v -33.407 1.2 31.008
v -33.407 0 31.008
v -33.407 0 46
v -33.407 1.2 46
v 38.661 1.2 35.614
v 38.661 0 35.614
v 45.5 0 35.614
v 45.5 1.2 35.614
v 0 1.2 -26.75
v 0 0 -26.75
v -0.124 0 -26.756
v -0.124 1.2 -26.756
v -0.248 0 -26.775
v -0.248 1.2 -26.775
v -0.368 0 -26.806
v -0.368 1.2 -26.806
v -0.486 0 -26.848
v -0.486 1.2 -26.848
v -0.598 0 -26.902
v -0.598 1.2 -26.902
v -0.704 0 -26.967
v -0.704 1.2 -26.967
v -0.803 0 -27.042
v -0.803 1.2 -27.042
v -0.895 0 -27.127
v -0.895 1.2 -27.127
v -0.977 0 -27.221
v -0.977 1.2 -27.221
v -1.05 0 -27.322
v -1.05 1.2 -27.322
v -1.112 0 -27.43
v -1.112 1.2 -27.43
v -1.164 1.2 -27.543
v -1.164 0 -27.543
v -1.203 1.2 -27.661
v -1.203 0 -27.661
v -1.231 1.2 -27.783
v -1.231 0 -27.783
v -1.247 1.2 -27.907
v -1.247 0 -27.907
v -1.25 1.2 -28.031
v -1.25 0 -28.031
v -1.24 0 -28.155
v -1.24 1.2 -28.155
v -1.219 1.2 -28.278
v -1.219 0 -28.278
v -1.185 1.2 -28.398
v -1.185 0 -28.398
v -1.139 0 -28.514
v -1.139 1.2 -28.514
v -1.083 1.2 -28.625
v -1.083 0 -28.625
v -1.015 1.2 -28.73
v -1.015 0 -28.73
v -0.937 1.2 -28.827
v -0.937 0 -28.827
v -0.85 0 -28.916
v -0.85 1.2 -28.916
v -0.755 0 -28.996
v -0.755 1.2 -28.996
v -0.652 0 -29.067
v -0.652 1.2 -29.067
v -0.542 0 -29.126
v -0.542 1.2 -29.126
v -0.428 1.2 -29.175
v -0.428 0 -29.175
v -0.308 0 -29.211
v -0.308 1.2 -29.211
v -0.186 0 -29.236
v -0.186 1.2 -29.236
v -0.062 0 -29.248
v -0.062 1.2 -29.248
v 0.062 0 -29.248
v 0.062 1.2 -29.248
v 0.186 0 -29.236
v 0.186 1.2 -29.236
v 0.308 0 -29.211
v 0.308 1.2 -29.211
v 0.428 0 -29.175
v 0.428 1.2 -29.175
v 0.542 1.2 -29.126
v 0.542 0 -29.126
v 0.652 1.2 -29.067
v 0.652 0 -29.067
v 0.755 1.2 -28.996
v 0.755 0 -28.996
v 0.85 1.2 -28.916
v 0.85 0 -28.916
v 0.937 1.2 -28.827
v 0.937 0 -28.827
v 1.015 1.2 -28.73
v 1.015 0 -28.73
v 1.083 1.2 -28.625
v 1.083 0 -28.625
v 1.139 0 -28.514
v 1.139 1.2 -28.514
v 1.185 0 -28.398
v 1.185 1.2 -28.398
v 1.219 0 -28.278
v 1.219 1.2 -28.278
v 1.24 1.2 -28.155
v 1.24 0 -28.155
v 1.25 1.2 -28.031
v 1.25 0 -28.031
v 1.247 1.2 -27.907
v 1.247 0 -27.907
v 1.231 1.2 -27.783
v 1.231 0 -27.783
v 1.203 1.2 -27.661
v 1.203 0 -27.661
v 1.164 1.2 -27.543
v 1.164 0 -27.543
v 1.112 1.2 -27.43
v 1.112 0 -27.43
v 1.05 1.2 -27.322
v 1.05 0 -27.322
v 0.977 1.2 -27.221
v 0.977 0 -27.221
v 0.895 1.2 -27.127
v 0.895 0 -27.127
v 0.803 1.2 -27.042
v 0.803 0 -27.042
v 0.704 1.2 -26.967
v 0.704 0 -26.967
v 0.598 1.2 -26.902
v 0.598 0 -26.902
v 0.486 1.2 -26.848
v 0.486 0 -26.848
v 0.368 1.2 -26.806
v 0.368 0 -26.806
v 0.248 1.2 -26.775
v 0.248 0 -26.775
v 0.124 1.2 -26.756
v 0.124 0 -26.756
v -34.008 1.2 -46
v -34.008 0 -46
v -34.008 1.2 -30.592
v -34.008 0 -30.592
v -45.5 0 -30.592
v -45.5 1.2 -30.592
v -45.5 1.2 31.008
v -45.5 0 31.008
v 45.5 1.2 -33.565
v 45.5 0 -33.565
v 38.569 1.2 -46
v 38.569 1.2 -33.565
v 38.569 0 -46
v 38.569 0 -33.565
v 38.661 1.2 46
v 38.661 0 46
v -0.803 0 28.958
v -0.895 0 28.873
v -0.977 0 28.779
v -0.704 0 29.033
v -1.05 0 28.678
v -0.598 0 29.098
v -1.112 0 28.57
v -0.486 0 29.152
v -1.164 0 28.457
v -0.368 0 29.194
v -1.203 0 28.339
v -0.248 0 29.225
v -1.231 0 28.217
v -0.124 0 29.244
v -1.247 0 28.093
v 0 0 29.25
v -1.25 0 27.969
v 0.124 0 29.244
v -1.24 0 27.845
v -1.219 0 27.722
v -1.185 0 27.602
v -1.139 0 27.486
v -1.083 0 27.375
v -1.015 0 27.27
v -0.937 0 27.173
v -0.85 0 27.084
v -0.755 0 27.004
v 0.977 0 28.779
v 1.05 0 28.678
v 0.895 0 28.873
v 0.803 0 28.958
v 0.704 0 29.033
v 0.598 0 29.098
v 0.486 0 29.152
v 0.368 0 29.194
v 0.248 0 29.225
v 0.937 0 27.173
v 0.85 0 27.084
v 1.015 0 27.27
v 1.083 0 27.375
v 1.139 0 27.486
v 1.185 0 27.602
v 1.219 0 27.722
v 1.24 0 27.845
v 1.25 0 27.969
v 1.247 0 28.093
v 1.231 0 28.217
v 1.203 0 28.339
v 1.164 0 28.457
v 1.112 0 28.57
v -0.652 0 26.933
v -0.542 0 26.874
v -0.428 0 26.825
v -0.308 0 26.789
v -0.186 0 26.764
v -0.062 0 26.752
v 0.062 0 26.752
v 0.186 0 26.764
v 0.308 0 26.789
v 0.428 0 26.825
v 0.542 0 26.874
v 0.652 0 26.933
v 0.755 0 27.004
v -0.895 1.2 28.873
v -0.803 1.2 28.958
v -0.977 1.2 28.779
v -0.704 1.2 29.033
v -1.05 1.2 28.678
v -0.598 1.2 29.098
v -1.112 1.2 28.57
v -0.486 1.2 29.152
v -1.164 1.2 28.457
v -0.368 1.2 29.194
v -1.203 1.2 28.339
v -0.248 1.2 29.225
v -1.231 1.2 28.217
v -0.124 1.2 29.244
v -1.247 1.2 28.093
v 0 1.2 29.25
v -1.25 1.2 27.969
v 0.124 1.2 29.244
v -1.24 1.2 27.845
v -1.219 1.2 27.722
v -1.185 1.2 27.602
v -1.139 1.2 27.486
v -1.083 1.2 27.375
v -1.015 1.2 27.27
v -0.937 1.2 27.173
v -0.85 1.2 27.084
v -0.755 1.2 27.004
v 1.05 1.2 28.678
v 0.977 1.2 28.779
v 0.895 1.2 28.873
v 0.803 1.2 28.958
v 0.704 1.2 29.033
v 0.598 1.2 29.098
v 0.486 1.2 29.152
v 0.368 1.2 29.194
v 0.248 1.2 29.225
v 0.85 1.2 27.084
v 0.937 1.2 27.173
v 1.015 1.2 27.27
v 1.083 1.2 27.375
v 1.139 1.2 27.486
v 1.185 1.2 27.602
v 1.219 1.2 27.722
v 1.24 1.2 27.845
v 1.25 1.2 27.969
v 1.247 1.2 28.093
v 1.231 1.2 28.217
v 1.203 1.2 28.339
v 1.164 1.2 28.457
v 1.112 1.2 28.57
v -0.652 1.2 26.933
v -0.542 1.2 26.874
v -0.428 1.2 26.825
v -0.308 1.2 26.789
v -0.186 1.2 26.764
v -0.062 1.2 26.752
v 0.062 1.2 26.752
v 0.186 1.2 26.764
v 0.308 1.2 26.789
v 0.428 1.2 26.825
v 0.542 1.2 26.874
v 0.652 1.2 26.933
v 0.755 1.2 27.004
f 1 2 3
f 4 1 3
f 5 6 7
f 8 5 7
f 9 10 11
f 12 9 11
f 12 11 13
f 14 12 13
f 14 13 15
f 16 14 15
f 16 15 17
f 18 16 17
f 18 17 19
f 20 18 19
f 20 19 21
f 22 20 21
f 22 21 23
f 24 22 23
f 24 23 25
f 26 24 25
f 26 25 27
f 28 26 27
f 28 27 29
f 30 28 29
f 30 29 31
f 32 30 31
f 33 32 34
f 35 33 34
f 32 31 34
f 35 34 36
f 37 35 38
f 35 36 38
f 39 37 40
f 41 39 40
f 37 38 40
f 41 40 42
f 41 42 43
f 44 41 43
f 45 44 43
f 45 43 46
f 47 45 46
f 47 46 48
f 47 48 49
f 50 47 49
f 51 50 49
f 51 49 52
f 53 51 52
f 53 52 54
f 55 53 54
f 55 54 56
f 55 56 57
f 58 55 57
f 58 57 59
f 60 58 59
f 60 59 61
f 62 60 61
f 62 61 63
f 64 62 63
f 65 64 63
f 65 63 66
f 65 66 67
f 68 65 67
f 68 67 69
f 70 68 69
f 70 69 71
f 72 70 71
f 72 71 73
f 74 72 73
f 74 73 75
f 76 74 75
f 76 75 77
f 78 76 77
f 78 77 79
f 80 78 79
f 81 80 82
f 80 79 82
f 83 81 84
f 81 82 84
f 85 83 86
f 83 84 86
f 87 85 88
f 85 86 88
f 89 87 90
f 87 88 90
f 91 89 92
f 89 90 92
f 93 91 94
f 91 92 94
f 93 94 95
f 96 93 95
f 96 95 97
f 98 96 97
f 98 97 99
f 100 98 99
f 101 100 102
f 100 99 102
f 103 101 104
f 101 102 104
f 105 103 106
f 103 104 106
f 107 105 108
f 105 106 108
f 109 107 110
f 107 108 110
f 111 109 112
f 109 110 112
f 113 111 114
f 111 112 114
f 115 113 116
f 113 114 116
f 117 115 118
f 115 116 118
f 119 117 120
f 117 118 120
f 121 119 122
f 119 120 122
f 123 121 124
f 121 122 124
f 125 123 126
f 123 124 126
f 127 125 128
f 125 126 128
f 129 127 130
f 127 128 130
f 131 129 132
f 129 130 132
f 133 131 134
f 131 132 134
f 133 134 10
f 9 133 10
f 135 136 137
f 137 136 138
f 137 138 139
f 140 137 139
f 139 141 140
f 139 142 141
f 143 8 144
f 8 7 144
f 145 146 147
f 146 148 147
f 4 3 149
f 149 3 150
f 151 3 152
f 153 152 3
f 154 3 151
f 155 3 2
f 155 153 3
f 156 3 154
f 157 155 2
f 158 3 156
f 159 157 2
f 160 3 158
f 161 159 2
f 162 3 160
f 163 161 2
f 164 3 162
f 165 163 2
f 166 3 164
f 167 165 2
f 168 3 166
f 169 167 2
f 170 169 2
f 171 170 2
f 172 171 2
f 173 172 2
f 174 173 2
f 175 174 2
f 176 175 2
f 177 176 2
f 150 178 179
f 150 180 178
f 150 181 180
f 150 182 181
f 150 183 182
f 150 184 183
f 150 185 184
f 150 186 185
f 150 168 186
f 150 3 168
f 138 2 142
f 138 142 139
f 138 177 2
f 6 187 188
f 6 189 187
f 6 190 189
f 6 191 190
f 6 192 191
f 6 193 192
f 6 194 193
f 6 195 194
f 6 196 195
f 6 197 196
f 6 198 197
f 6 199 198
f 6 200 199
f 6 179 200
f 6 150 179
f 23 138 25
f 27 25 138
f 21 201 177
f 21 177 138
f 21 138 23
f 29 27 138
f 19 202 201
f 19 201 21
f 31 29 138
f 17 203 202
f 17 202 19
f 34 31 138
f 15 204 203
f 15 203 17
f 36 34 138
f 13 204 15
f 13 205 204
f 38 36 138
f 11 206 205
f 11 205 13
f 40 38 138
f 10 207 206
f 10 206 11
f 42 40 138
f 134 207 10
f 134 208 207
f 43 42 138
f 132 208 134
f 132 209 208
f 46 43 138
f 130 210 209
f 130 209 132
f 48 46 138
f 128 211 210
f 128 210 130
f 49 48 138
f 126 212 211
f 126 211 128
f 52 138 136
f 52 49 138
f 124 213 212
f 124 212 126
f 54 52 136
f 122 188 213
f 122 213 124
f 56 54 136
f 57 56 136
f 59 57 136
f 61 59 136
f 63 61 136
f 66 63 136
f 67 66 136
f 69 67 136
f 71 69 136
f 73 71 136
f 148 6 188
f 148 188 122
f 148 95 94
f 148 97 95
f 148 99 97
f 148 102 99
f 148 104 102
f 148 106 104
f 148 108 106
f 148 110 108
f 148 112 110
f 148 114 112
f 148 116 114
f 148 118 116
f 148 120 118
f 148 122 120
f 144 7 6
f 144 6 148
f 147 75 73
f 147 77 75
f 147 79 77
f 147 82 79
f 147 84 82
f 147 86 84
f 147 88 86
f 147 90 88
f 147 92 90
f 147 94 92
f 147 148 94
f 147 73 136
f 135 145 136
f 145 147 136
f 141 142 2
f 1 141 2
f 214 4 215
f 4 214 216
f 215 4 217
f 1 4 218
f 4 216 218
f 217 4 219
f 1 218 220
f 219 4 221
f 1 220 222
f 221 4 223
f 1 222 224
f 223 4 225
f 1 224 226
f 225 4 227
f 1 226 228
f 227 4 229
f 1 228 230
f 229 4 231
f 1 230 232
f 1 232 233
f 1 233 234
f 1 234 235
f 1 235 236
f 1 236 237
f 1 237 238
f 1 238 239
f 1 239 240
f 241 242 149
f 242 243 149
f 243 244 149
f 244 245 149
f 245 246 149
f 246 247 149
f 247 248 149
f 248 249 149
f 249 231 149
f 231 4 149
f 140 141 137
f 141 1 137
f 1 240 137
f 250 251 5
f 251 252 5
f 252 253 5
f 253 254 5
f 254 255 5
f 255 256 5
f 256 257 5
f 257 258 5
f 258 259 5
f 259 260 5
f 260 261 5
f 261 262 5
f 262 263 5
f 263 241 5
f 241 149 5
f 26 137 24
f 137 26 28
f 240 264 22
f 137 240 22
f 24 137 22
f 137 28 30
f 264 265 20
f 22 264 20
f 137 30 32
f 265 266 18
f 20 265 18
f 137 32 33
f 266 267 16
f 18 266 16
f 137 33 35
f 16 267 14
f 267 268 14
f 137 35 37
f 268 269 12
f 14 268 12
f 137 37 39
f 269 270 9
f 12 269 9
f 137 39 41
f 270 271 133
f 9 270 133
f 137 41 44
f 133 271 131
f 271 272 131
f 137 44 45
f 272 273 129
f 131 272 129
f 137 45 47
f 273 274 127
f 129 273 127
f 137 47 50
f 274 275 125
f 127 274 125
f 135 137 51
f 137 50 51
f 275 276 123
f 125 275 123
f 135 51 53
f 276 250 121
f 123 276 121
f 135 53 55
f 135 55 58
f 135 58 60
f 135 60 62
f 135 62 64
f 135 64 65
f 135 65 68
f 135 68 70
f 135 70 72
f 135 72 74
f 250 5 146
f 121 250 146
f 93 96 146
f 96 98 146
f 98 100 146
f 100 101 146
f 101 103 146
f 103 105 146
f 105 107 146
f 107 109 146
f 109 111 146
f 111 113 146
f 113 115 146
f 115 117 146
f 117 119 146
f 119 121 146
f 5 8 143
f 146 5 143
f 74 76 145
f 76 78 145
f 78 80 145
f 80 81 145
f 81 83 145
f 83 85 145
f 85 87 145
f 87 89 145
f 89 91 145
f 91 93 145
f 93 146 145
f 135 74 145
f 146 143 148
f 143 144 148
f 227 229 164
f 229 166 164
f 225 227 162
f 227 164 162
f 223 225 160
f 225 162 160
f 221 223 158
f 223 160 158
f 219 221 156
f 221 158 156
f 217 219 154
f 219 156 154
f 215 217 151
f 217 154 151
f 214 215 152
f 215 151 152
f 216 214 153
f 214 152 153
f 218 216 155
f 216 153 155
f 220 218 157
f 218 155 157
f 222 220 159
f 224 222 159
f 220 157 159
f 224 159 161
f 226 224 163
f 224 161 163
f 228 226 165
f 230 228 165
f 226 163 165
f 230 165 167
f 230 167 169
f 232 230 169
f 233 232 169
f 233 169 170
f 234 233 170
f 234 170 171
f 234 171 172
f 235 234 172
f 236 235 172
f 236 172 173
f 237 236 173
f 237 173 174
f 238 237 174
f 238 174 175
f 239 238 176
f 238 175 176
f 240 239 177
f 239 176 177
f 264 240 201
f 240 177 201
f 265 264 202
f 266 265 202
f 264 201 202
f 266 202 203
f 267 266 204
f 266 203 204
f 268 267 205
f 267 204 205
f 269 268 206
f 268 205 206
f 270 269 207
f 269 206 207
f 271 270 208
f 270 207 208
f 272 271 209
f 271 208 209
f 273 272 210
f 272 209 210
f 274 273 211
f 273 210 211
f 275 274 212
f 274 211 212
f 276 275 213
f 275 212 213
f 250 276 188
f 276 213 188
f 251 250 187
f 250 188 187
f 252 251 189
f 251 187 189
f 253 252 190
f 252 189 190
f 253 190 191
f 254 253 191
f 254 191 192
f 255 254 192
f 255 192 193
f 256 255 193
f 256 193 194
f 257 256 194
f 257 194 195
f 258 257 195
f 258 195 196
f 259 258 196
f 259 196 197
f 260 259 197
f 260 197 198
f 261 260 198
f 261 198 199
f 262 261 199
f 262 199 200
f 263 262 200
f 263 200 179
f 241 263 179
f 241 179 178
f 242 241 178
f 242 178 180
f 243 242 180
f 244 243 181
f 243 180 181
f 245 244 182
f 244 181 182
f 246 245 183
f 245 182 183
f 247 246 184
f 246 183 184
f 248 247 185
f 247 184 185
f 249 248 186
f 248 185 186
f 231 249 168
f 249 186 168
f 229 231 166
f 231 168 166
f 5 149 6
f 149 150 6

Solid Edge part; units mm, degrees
sketch "Sketch1" plane through (0, 0, 0) normal (0, -1, 0) x (1, 0, 0)
  line L0 (-47, -47) -> (47, -47)
  line L1 (47, -47) -> (47, 47)
  line L2 (47, 47) -> (-47, 47)
  line L3 (-47, 47) -> (-47, -47)
  dimension "D1" = 47
  dimension "D2" = 47
  dimension "D3" = 47
  dimension "D4" = 47
extrude "Protrusion1" add sketch "Sketch1" against normal blind 1.2
sketch "Sketch2" plane through (0, 1.2, 0) normal (0, 1, 0) x (0, 0, -1)
  line L0 (-31.0077, 45.5) -> (-31.0077, 33.4066)
  line L1 (-31.0077, 33.4066) -> (-46, 33.4066)
  line L2 (-46, 33.4066) -> (-46, -38.6606)
  line L3 (-46, -38.6606) -> (-35.6145, -38.6606)
  line L4 (-35.6145, -38.6606) -> (-35.6145, -45.5)
  line L5 (-35.6145, -45.5) -> (33.5653, -45.5)
  line L6 (33.5653, -45.5) -> (33.5653, -38.5694)
  line L7 (33.5653, -38.5694) -> (46, -38.5694)
  line L8 (46, -38.5694) -> (46, 34.0082)
  line L9 (46, 34.0082) -> (30.5923, 34.0082)
  line L10 (30.5923, 34.0082) -> (30.5923, 44.4526)
  line L11 (30.5923, 45.5) -> (30.5923, 44.4526)
  line L12 (-31.0077, 45.5) -> (30.5923, 45.5)
  dimension "D1" = 1
  dimension "D2" = 1
  dimension "D3" = 1
  dimension "D4" = 1
  dimension "D5" = 1
  dimension "D6" = 1
  dimension "D7" = 1
  dimension "D8" = 1
  dimension "D9" = 1
  dimension "D10" = 1
extrude "Cutout1" cut sketch "Sketch2" along normal mid plane 166.709 flip side to cut
sketch "Sketch3" plane through (0, 0, 0) normal (0, -1, 0) x (0, 0, 1)
  circle A0 centre (28, 0) radius 1.25
  dimension "D1" = 18
extrude "ExtrudedCutout_4" cut sketch "Sketch3" along normal mid plane 57.9991
sketch "Sketch4" plane through (0, 0, 0) normal (0, -1, 0) x (0, 0, 1)
  circle A0 centre (-28, 0) radius 1.25
  dimension "D1" = 18
extrude "ExtrudedCutout_5" cut sketch "Sketch4" along normal mid plane 49.1039
properties material "Epoxy, cast rigid"
